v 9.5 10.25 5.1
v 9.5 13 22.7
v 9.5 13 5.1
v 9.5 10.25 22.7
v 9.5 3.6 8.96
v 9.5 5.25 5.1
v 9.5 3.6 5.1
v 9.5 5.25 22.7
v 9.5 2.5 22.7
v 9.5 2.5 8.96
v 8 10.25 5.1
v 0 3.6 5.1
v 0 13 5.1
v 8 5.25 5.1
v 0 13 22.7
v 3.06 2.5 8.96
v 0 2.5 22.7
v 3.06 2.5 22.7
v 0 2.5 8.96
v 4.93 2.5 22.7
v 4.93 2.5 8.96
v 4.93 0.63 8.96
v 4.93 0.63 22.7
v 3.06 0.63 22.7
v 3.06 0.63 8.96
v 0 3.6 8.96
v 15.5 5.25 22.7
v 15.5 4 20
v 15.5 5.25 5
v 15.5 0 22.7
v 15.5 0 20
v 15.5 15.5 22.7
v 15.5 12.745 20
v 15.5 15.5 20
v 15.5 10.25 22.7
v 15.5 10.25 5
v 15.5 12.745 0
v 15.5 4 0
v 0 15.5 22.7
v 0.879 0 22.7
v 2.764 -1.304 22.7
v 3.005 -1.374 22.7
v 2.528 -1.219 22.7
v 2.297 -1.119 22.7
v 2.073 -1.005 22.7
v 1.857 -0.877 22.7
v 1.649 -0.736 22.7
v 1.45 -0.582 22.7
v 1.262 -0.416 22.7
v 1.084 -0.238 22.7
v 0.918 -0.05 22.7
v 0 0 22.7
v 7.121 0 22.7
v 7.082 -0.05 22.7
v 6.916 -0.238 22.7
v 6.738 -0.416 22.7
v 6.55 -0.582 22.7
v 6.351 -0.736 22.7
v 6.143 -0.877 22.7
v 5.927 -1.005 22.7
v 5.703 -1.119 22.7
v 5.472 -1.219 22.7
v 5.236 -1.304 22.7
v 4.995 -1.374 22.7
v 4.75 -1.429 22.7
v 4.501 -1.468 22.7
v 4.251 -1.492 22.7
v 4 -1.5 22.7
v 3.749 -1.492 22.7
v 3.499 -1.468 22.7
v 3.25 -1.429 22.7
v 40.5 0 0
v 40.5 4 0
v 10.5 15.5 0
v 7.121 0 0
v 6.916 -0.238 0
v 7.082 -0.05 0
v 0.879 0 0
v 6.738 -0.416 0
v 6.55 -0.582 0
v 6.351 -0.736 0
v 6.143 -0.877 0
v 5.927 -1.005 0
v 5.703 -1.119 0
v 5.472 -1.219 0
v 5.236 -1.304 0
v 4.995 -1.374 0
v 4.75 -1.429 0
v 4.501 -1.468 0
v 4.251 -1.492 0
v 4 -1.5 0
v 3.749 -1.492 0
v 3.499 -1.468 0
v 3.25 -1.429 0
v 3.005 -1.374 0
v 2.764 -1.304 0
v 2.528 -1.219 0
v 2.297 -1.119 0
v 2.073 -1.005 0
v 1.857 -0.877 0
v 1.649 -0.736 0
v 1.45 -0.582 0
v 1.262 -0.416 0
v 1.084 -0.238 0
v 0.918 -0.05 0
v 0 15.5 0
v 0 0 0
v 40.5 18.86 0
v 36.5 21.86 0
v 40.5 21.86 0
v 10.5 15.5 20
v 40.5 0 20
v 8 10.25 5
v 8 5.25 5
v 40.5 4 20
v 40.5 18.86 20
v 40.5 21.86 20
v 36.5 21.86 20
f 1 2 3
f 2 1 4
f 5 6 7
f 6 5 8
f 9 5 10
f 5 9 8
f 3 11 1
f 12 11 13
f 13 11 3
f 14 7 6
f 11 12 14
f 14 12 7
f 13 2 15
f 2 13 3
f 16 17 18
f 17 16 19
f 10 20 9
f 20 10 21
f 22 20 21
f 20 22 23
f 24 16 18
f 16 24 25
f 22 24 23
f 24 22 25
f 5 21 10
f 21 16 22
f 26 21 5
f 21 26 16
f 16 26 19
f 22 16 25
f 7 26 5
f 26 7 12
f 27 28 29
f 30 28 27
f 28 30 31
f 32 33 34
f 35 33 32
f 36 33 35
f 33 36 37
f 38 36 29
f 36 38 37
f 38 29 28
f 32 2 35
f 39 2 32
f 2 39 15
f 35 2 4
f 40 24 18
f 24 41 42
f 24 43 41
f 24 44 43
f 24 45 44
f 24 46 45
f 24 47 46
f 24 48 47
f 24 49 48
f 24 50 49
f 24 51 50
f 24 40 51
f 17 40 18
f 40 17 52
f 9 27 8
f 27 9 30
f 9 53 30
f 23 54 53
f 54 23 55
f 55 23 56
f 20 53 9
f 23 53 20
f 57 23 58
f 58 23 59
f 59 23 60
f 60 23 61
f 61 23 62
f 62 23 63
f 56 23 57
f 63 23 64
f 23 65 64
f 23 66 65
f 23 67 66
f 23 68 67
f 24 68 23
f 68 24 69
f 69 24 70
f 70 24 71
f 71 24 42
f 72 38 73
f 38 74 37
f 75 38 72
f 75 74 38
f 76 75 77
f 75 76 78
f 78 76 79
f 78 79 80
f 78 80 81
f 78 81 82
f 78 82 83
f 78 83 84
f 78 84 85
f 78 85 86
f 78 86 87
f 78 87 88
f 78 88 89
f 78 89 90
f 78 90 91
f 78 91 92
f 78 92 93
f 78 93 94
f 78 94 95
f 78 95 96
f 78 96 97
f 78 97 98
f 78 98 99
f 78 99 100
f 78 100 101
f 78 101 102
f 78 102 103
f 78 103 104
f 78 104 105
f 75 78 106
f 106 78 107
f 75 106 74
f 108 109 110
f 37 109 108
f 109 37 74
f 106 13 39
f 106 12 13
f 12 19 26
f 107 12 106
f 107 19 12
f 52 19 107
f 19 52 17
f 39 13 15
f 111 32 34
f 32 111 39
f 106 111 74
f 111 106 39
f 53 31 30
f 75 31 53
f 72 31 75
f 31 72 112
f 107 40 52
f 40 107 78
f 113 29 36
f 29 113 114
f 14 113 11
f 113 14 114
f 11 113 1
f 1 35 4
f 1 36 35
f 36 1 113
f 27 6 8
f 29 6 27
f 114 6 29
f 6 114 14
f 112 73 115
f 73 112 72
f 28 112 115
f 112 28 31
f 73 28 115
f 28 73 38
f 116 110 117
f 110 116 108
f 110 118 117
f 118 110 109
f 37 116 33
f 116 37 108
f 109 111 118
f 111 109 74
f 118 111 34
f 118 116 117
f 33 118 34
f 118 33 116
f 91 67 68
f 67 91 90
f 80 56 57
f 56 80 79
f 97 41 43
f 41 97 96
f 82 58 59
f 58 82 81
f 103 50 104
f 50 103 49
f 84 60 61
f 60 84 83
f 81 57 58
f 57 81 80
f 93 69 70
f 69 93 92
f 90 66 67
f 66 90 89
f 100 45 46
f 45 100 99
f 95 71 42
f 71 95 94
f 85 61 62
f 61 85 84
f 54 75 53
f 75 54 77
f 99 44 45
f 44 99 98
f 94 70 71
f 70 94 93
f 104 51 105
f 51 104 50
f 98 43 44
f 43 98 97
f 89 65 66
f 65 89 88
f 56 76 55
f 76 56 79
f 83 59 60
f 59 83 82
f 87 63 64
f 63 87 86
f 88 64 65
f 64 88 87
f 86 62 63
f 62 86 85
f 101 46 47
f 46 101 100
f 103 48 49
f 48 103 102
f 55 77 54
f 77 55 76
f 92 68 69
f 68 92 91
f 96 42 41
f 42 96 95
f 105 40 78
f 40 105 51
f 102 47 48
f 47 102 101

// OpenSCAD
tolerance = 0.2;
jack_depth = 10.3 + tolerance;
jack_width = 10.3 + tolerance;
jack_height = 17.5 + tolerance;
jack_tab_depth = 4.56 + tolerance;
jack_tab_width = 1.2 + tolerance;
jack_tab_height = 1.67 + tolerance;
jack_notch_height = 3.66 + tolerance;
jack_notch_width = 1.7 + tolerance;

$fn = 100;

module jack_shape()
{
	difference() {
		union() {
			cube(size = [jack_depth, jack_width, jack_height]);
			translate(v = [jack_tab_depth - jack_tab_width / 2, -jack_tab_height, 0])
				cube(size = [jack_tab_height, jack_tab_height + 1, jack_height]);
		}
		translate(v = [-1, -(jack_notch_width + 4 *tolerance), -1])
			cube(size = [jack_depth * 2, jack_notch_width * 2, 1 + jack_notch_height]);
	}
}

module bulge() {

	difference() {
	translate(v = [4, 0, 0]) {
		union() {
			cylinder(r1 = 4, r2 = 4, h = jack_height + 5);
		}
	}
	translate(v = [0, -2, -1])
		cube(size = [10, 10, jack_height + 10]);
	}
}

module jack_holder()
{
	difference()  {
		cube(size = [jack_depth + 5, jack_width + 5, jack_height + 5]);
		translate(v = [-1, 2.5, 5.1])
			jack_shape();
		translate(v = [8, jack_width / 2, 5])
			cube(size = [10, 5, jack_height * 2]);
	}
}

module jack_legs()
{
	translate(v = [jack_depth, 0, 0])
		cube(size = [30, 4, 20]);
	hull() {
		translate(v = [jack_depth, jack_width + 2, 0])
			cube(size = [4, 3, 20]);
		translate(v = [jack_depth + 26, 22.86 - 4, 0])
			cube(size = [4, 3, 20]);
	}
}

union() {
	jack_holder();
	jack_legs();
	translate(v = [0, 2.5, 0])
		bulge();
}
